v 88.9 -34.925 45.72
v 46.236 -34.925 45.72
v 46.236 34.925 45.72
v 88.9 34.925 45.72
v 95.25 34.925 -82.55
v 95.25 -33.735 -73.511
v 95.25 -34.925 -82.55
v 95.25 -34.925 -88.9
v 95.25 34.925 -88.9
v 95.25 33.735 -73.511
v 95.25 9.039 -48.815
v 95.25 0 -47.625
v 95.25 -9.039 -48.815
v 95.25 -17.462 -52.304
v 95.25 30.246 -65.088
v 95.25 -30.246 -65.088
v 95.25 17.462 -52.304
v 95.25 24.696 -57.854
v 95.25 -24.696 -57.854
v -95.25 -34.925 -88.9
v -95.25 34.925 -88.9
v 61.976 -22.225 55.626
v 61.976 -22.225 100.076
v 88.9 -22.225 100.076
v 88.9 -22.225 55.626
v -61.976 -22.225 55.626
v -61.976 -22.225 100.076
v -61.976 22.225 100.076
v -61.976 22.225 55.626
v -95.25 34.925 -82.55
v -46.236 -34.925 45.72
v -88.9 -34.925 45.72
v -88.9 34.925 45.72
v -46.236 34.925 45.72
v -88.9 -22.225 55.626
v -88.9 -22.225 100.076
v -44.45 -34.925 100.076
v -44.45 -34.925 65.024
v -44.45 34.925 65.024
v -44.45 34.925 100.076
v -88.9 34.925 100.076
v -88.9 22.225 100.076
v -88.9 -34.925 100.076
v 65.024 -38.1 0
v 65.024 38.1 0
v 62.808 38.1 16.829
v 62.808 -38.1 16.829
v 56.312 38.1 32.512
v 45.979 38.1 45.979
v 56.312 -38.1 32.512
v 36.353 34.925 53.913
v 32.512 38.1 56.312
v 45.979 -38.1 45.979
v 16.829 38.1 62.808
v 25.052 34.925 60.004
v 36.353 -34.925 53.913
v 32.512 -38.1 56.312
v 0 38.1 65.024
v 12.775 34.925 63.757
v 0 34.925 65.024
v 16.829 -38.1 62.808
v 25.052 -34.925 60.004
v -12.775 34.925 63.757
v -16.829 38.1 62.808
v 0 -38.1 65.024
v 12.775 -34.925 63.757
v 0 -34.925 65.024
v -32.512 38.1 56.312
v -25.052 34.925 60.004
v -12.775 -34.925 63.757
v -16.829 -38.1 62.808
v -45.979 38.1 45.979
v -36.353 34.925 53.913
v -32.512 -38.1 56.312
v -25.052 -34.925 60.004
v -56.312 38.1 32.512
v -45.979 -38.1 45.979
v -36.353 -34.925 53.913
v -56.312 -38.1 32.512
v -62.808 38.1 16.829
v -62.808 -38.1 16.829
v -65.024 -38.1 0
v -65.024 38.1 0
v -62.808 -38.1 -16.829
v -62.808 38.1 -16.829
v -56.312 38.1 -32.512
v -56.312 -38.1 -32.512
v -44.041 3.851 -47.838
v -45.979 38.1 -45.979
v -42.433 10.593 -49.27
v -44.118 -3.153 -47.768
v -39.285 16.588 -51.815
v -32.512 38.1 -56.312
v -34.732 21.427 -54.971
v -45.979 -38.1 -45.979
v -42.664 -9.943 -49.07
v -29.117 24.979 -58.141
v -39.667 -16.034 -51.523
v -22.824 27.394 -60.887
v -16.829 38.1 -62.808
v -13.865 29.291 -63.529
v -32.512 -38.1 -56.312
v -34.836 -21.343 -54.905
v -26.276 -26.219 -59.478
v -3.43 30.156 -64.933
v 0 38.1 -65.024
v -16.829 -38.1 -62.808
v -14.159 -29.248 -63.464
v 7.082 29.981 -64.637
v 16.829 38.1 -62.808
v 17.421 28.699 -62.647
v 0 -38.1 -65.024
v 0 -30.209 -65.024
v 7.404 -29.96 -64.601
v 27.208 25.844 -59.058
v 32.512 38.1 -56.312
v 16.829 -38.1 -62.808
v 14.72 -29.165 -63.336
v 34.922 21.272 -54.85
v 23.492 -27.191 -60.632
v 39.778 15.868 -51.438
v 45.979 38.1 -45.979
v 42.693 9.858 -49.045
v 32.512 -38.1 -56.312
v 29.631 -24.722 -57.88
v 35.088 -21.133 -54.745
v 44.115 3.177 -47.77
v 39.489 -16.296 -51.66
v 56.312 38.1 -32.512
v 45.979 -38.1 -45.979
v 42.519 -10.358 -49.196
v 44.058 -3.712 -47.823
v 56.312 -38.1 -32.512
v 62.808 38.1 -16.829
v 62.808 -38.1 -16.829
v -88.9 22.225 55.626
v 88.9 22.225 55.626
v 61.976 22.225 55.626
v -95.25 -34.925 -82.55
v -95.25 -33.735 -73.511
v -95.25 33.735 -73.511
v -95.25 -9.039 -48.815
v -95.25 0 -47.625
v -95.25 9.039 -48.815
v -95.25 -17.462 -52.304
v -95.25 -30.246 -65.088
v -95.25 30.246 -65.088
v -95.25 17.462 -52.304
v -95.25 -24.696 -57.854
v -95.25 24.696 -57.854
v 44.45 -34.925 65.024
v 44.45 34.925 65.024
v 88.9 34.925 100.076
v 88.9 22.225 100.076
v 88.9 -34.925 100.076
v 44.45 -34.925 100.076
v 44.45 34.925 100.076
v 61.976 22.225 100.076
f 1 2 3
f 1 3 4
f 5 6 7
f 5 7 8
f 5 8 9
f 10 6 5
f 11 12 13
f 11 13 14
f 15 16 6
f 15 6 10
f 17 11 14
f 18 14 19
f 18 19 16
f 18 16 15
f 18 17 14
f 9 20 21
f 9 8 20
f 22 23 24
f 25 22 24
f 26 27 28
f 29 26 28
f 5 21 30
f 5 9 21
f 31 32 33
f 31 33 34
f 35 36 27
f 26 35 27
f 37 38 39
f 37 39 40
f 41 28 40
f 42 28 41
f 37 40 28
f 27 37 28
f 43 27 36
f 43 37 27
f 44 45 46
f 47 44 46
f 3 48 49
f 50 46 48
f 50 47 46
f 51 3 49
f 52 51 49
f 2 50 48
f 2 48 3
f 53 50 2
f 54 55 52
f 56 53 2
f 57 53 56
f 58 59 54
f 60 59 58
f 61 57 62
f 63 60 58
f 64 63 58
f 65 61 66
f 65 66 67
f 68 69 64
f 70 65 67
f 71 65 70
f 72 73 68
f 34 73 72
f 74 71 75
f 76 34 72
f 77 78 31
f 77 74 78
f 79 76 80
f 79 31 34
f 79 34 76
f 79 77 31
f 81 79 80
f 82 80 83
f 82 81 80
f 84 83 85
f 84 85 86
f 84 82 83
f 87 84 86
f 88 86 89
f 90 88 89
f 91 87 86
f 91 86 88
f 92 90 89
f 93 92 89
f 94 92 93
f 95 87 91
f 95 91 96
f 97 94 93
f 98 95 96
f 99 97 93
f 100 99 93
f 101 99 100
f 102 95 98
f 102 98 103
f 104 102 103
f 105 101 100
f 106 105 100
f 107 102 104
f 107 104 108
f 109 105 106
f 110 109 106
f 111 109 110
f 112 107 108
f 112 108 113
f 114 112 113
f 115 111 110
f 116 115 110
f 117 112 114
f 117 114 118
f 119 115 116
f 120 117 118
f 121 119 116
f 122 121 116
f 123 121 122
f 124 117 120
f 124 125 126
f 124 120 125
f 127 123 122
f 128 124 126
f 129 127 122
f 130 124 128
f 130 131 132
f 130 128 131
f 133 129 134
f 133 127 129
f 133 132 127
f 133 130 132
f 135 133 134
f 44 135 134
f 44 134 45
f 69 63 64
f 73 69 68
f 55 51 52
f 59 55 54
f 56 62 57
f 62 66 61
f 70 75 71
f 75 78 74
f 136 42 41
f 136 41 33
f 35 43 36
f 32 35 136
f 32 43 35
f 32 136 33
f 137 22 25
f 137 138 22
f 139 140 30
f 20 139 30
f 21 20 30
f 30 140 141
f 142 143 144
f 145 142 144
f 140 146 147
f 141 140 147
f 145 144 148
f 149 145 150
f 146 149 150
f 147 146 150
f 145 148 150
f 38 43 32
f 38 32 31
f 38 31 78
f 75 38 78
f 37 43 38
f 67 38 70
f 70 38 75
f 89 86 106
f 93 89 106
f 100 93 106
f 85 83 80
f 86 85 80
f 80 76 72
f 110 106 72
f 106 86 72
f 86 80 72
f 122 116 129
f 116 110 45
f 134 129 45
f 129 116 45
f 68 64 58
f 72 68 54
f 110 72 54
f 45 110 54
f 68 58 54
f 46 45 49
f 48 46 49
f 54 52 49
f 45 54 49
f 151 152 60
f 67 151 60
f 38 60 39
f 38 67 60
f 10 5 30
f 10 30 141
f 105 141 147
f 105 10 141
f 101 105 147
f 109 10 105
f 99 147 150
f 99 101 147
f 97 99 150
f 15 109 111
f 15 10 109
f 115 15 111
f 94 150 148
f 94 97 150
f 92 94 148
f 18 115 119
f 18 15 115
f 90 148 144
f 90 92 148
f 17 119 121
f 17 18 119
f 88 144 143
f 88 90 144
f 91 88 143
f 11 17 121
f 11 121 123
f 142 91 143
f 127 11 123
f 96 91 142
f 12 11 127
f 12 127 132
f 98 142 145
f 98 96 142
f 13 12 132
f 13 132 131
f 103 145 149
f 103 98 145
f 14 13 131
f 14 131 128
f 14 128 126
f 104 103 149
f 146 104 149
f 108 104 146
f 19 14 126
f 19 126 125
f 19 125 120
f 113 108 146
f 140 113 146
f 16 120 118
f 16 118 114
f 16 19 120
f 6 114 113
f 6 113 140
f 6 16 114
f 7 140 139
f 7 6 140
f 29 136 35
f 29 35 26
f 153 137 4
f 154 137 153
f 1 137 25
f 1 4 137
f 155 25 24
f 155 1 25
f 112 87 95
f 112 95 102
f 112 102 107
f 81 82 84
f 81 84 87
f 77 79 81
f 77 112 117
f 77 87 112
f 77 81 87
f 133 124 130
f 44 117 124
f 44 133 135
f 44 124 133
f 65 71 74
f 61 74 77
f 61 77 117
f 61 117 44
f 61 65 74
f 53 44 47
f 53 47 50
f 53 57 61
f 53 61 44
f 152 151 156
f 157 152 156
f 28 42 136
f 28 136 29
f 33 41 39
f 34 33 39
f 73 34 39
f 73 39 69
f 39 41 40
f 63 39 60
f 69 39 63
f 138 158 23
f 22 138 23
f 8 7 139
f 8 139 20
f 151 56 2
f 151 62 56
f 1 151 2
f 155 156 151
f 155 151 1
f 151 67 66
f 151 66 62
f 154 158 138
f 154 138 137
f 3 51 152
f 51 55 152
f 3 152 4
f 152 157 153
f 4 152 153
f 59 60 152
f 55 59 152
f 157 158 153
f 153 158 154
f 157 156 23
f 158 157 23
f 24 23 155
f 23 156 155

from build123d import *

# Parameters (mm, degrees)
F0_R     = 65.024
F1_DEPTH = 38.1
F3_DEPTH = 95.25
F4_W     = 44.45
F4_H     = 35.052
F5_DEPTH = 34.925
F6_W     = 57.531
F6_H     = 44.45
F6_W_2   = 26.924
F6_H_2   = 22.225
F7_DEPTH = 44.45


with BuildPart() as f1:
    # F0 (on Front) → F1 (new body, symmetric)
    with BuildSketch(Plane.XZ):
        Circle(F0_R)
    extrude(amount=F1_DEPTH, both=True)

    # F2 (on Right) → F3 (join, symmetric)
    with BuildSketch(Plane.YZ):
        with BuildLine():
            Line((34.925, -88.9), (34.925, -82.55))
            ThreePointArc((34.925, -82.55), (24.6957043329, -57.8542956671), (0, -47.625))
            ThreePointArc((0, -47.625), (-24.6957043329, -57.8542956671), (-34.925, -82.55))
            Line((-34.925, -82.55), (-34.925, -88.9))
            Line((-34.925, -88.9), (34.925, -88.9))
        make_face()
    extrude(amount=F3_DEPTH, both=True)

    # F4 (on Front) → F5 (join, symmetric)
    with BuildSketch(Plane.XZ):
        Polygon((-88.9, 45.72), (0, 45.72), (0, 65.024), (-44.45, 65.024), (-44.45, 100.076), (-88.9, 100.076), align=None)
        with Locations((66.675, 82.55)):
            Rectangle(F4_W, F4_H)
        Polygon((0, 65.024), (0, 45.72), (88.9, 45.72), (88.9, 65.024), (44.45, 65.024), align=None)
    extrude(amount=F5_DEPTH, both=True)

    # F6 (on face) → F7 (cut)
    with BuildSketch(Plane.XY.offset(100.076)):
        with Locations((-90.7415, 0)):
            Rectangle(F6_W, F6_H)
        with Locations((75.438, -11.1125)):
            Rectangle(F6_W_2, F6_H_2)
        with Locations((75.438, 11.1125)):
            Rectangle(F6_W_2, F6_H_2)
    extrude(amount=-F7_DEPTH, mode=Mode.SUBTRACT)


solid = f1.part
